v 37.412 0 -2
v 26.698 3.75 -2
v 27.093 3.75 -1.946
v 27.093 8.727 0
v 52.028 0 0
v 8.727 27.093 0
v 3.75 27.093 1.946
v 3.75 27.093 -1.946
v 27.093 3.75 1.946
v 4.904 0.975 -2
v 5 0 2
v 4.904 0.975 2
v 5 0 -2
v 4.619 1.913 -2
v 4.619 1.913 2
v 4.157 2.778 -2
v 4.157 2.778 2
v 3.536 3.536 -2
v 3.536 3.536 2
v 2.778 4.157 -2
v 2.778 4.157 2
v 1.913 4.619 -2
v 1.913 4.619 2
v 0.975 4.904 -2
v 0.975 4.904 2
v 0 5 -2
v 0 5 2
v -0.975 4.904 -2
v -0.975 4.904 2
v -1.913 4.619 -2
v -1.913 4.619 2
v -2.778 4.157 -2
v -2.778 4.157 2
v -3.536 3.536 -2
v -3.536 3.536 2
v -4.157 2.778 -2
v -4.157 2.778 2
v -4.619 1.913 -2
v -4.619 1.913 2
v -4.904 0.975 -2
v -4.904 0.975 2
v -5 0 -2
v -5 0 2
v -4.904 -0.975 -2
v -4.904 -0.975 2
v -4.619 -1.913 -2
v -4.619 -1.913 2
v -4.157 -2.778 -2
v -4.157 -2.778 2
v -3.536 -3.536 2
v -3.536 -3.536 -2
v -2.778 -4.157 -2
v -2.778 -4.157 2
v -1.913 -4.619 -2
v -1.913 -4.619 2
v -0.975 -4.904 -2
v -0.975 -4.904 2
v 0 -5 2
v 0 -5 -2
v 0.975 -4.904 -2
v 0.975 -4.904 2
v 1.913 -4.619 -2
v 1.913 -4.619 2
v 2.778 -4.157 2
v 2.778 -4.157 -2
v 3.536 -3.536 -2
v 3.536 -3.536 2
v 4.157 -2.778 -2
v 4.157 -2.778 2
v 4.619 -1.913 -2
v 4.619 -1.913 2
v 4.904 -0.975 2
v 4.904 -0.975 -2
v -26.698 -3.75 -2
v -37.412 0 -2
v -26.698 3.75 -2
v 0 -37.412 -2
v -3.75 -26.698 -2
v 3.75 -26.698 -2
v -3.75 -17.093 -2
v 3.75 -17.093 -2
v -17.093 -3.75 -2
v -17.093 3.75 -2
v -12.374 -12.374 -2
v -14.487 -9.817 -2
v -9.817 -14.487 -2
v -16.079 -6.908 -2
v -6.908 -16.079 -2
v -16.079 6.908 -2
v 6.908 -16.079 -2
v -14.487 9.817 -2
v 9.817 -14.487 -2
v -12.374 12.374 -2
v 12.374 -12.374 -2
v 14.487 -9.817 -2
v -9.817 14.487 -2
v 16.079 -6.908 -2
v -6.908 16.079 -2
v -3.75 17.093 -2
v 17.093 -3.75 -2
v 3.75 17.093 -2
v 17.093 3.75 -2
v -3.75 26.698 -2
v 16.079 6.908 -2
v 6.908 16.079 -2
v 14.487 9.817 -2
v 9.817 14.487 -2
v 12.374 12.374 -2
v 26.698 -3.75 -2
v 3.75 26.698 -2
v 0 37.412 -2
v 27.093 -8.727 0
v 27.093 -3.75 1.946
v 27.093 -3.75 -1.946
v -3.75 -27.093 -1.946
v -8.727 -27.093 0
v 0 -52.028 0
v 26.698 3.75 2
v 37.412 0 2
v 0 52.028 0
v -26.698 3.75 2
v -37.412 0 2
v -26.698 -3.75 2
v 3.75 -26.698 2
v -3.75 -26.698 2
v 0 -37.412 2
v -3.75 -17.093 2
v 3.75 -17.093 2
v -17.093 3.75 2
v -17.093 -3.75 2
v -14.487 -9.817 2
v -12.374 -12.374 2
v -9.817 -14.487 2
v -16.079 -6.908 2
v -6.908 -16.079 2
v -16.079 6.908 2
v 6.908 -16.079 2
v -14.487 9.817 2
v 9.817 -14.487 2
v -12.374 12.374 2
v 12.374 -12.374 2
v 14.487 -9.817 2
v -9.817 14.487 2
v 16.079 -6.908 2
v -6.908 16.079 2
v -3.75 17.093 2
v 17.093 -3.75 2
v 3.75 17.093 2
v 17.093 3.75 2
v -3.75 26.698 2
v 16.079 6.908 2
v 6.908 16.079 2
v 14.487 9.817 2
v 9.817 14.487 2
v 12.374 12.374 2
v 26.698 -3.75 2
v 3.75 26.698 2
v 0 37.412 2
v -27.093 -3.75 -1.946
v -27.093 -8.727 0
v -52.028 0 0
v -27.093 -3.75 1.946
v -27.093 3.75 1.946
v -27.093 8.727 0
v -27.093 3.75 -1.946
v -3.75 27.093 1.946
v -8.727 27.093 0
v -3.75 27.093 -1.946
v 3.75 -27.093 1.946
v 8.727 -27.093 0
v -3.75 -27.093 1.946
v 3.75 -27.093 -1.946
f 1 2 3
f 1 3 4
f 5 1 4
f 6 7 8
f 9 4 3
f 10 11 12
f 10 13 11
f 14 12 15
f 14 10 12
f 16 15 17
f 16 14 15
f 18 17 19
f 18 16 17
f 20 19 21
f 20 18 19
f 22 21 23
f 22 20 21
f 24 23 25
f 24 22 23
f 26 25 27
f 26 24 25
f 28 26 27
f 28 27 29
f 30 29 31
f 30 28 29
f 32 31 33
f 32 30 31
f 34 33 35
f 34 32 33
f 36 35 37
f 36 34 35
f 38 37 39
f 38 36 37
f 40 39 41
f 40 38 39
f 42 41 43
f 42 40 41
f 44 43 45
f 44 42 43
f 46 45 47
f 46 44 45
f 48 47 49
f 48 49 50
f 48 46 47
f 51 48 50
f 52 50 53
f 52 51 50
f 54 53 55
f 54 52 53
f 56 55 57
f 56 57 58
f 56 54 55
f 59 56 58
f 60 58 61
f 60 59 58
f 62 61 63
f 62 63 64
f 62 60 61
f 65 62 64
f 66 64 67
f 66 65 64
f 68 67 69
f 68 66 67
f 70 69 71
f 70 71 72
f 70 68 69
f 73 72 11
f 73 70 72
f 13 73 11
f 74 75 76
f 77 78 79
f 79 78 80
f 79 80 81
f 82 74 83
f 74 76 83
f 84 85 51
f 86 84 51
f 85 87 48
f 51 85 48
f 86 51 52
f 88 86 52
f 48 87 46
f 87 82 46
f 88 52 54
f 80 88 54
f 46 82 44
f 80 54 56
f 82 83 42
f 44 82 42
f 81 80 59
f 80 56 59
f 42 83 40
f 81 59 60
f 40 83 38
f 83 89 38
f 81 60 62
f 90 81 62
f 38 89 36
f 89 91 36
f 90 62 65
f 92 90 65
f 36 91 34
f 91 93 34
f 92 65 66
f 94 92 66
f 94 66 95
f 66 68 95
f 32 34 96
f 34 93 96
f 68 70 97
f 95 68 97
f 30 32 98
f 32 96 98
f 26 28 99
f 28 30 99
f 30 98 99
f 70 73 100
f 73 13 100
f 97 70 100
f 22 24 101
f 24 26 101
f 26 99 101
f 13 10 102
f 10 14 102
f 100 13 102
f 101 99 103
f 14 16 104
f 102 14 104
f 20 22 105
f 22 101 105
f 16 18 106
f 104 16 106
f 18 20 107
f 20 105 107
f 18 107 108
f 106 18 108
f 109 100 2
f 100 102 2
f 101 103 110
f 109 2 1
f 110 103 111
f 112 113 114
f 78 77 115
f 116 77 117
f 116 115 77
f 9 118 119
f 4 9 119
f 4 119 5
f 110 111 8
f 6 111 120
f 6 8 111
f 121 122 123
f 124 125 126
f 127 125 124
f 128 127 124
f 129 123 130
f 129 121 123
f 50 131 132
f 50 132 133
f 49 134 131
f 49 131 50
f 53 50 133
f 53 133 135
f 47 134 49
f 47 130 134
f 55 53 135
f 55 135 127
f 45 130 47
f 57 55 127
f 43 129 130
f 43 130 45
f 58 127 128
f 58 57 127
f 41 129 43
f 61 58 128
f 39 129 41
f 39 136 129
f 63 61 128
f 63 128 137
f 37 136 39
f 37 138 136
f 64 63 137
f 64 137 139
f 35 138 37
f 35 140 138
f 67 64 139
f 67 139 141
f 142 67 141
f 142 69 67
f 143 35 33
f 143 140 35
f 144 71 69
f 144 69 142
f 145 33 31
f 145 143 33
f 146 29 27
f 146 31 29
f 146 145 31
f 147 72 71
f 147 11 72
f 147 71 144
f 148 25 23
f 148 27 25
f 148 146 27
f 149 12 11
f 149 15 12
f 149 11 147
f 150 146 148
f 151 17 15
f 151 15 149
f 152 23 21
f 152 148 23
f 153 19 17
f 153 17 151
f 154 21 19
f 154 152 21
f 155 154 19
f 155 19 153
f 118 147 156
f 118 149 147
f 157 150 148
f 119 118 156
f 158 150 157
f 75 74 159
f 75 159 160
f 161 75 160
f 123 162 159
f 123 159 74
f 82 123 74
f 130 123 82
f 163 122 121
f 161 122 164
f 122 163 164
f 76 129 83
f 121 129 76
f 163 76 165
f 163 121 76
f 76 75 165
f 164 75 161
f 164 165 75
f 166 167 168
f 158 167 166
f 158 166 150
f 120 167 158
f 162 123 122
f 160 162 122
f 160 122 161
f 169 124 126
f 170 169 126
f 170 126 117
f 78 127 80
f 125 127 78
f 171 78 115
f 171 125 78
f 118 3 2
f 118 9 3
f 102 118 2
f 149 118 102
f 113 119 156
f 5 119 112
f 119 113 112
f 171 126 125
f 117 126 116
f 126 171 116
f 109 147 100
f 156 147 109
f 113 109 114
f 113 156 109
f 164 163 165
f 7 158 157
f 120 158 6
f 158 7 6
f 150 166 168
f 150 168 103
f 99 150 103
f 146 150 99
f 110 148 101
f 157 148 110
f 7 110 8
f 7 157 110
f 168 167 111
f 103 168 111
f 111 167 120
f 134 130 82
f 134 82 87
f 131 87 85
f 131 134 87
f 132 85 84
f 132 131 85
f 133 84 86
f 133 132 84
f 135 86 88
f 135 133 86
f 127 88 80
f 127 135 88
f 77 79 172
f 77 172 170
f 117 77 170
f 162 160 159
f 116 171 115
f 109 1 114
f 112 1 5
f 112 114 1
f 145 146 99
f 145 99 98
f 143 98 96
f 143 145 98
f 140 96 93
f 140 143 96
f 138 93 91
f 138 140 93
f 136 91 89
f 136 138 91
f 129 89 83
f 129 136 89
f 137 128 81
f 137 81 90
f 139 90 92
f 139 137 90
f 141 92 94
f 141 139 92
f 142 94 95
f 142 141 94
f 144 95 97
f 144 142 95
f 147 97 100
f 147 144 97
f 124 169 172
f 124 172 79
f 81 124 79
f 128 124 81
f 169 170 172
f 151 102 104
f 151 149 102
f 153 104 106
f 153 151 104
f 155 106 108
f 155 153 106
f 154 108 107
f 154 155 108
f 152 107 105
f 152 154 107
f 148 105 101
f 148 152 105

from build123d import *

# Parameters (mm, degrees)
F0_R         = 5
F1_DEPTH     = 2
F2_SIZE      = 1.99999
F3_T1_DEPTH  = 34.8509927222
F3_T3_DEPTH  = 34.8509927222
F3_T5_DEPTH  = 34.8509927222
F3_T7_DEPTH  = 34.8509927222
F3_T9_DEPTH  = 34.8509927222
F3_T11_DEPTH = 34.8509927222
F3_T13_DEPTH = 34.8509927222
F3_T15_DEPTH = 34.8509927222


# Not quite as in the source:
# - a fillet or chamfer that OpenCascade refuses, or shapes differently, is made with other operations: its cross-section is extruded or revolved along the edge and cut away or added
# - a fillet or chamfer is up to 0.001 mm smaller than in the source, because OpenCascade refuses the exact size


with BuildPart() as f1:
    # F0 (on Top) → F1 (new body, symmetric)
    with BuildSketch(Plane.XY):
        with BuildLine():
            ThreePointArc((17.093492914, -3.75), (17.3980764166, -1.8859843591), (17.5, 0))
            ThreePointArc((17.5, 0), (17.3980764166, 1.8859843591), (17.093492914, 3.75))
            ThreePointArc((17.093492914, 3.75), (12.3743686708, 12.3743686708), (3.75, 17.093492914))
            ThreePointArc((3.75, 17.093492914), (0, 17.5), (-3.75, 17.093492914))
            ThreePointArc((-3.75, 17.093492914), (-12.3743686708, 12.3743686708), (-17.093492914, 3.75))
            ThreePointArc((-17.093492914, 3.75), (-17.5, 0), (-17.093492914, -3.75))
            ThreePointArc((-17.093492914, -3.75), (-12.3743686708, -12.3743686708), (-3.75, -17.093492914))
            ThreePointArc((-3.75, -17.093492914), (0, -17.5), (3.75, -17.093492914))
            ThreePointArc((3.75, -17.093492914), (12.3743686708, -12.3743686708), (17.093492914, -3.75))
        make_face()
        Circle(F0_R, mode=Mode.SUBTRACT)
        with BuildLine():
            ThreePointArc((-17.093492914, -3.75), (-17.5, 0), (-17.093492914, 3.75))
            Line((-17.093492914, 3.75), (-27.093492914, 3.75))
            Line((-27.093492914, 3.75), (-27.093492914, -3.75))
            Line((-27.093492914, -3.75), (-17.093492914, -3.75))
        make_face()
        Polygon((-27.093492914, -3.75), (-27.093492914, 3.75), (-27.093492914, 8.75), (-52.093492914, 0), (-27.093492914, -8.75), align=None)
        with BuildLine():
            ThreePointArc((-3.75, 17.093492914), (0, 17.5), (3.75, 17.093492914))
            Line((3.75, 17.093492914), (3.75, 27.093492914))
            Line((3.75, 27.093492914), (-3.75, 27.093492914))
            Line((-3.75, 27.093492914), (-3.75, 17.093492914))
        make_face()
        Polygon((-3.75, 27.093492914), (3.75, 27.093492914), (8.75, 27.093492914), (0, 52.093492914), (-8.75, 27.093492914), align=None)
        Polygon((27.093492914, 8.75), (27.093492914, 3.75), (27.093492914, -3.75), (27.093492914, -8.75), (52.093492914, 0), align=None)
        Polygon((8.75, -27.093492914), (3.75, -27.093492914), (-3.75, -27.093492914), (-8.75, -27.093492914), (0, -52.093492914), align=None)
        with BuildLine():
            Line((3.75, -27.093492914), (3.75, -17.093492914))
            ThreePointArc((3.75, -17.093492914), (0, -17.5), (-3.75, -17.093492914))
            Line((-3.75, -17.093492914), (-3.75, -27.093492914))
            Line((-3.75, -27.093492914), (3.75, -27.093492914))
        make_face()
        with BuildLine():
            ThreePointArc((17.093492914, 3.75), (17.3980764166, 1.8859843591), (17.5, 0))
            ThreePointArc((17.5, 0), (17.3980764166, -1.8859843591), (17.093492914, -3.75))
            Line((17.093492914, -3.75), (27.093492914, -3.75))
            Line((27.093492914, -3.75), (27.093492914, 3.75))
            Line((27.093492914, 3.75), (17.093492914, 3.75))
        make_face()
    extrude(amount=F1_DEPTH, both=True)

    # F2 (size 2 in the source; OpenCascade refuses exactly that, so slightly less here)
    f2_edges = [f1.edges().sort_by_distance(p)[0] for p in [
        (4.375, -39.593493, 2),
        (-4.375, -39.593493, 2),
        (4.375, -39.593493, -2),
        (-4.375, -39.593493, -2),
        (39.593493, -4.375, -2),
        (39.593493, -4.375, 2),
        (39.593493, 4.375, 2),
        (-39.593493, -4.375, 2),
        (-39.593493, -4.375, -2),
        (-4.375, 39.593493, 2),
        (4.375, 39.593493, 2),
        (39.593493, 4.375, -2),
        (4.375, 39.593493, -2),
        (-39.593493, 4.375, 2),
        (-39.593493, 4.375, -2),
        (-4.375, 39.593493, -2),
    ]]
    chamfer(f2_edges, length=F2_SIZE)

    # F3: chamfer of 2.85 on 16 edges, made by hand

    # F3_s2 → F3_t1 (cut)
    with BuildSketch(Plane(origin=(-16.7962484861, -47.9892813888, 0), x_dir=(0, 0, 1), z_dir=(0.3303504247, 0.9438583564, 0))):
        Polygon((2, 12.3591175097), (-0.0152543264, 17.2243718361), (2, 15.2091175097), align=None)
        Polygon((-2, 12.3591175097), (0.0152543264, 17.2243718361), (-2, 15.2091175097), align=None)
    extrude(amount=F3_T1_DEPTH, mode=Mode.SUBTRACT)

    # F3_s4 → F3_t3 (cut)
    with BuildSketch(Plane(origin=(5.2832082381, -15.0948806803, 0), x_dir=(0, 0, 1), z_dir=(0.3303504247, -0.9438583564, 0))):
        Polygon((2, 12.3591175097), (-0.0152543264, 17.2243718361), (2, 15.2091175097), align=None)
        Polygon((-2, 12.3591175097), (0.0152543264, 17.2243718361), (-2, 15.2091175097), align=None)
    extrude(amount=F3_T3_DEPTH, mode=Mode.SUBTRACT)

    # F3_s6 → F3_t5 (cut)
    with BuildSketch(Plane(origin=(15.0948806803, 5.2832082381, 0), x_dir=(0, 0, 1), z_dir=(0.9438583564, 0.3303504247, 0))):
        Polygon((2, 12.3591175097), (-0.0152543264, 17.2243718361), (2, 15.2091175097), align=None)
        Polygon((-2, 12.3591175097), (0.0152543264, 17.2243718361), (-2, 15.2091175097), align=None)
    extrude(amount=F3_T5_DEPTH, mode=Mode.SUBTRACT)

    # F3_s8 → F3_t7 (cut)
    with BuildSketch(Plane(origin=(47.9892813888, -16.7962484861, 0), x_dir=(0, 0, 1), z_dir=(-0.9438583564, 0.3303504247, 0))):
        Polygon((2, 12.3591175097), (-0.0152543264, 17.2243718361), (2, 15.2091175097), align=None)
        Polygon((-2, 12.3591175097), (0.0152543264, 17.2243718361), (-2, 15.2091175097), align=None)
    extrude(amount=F3_T7_DEPTH, mode=Mode.SUBTRACT)

    # F3_s10 → F3_t9 (cut)
    with BuildSketch(Plane(origin=(-5.2832082381, 15.0948806803, 0), x_dir=(0, 0, 1), z_dir=(-0.3303504247, 0.9438583564, 0))):
        Polygon((2, 12.3591175097), (-0.0152543264, 17.2243718361), (2, 15.2091175097), align=None)
        Polygon((-2, 12.3591175097), (0.0152543264, 17.2243718361), (-2, 15.2091175097), align=None)
    extrude(amount=F3_T9_DEPTH, mode=Mode.SUBTRACT)

    # F3_s12 → F3_t11 (cut)
    with BuildSketch(Plane(origin=(16.7962484861, 47.9892813888, 0), x_dir=(0, 0, 1), z_dir=(-0.3303504247, -0.9438583564, 0))):
        Polygon((-0.0152543264, 17.2243718361), (2, 12.3591175097), (2, 15.2091175097), align=None)
        Polygon((0.0152543264, 17.2243718361), (-2, 12.3591175097), (-2, 15.2091175097), align=None)
    extrude(amount=F3_T11_DEPTH, mode=Mode.SUBTRACT)

    # F3_s14 → F3_t13 (cut)
    with BuildSketch(Plane(origin=(-15.0948806803, -5.2832082381, 0), x_dir=(0, 0, 1), z_dir=(-0.9438583564, -0.3303504247, 0))):
        Polygon((2, 12.3591175097), (-0.0152543264, 17.2243718361), (2, 15.2091175097), align=None)
        Polygon((-2, 12.3591175097), (0.0152543264, 17.2243718361), (-2, 15.2091175097), align=None)
    extrude(amount=F3_T13_DEPTH, mode=Mode.SUBTRACT)

    # F3_s16 → F3_t15 (cut)
    with BuildSketch(Plane(origin=(-47.9892813888, 16.7962484861, 0), x_dir=(0, 0, 1), z_dir=(0.9438583564, -0.3303504247, 0))):
        Polygon((2, 12.3591175097), (-0.0152543264, 17.2243718361), (2, 15.2091175097), align=None)
        Polygon((-2, 12.3591175097), (0.0152543264, 17.2243718361), (-2, 15.2091175097), align=None)
    extrude(amount=F3_T15_DEPTH, mode=Mode.SUBTRACT)


solid = f1.part
